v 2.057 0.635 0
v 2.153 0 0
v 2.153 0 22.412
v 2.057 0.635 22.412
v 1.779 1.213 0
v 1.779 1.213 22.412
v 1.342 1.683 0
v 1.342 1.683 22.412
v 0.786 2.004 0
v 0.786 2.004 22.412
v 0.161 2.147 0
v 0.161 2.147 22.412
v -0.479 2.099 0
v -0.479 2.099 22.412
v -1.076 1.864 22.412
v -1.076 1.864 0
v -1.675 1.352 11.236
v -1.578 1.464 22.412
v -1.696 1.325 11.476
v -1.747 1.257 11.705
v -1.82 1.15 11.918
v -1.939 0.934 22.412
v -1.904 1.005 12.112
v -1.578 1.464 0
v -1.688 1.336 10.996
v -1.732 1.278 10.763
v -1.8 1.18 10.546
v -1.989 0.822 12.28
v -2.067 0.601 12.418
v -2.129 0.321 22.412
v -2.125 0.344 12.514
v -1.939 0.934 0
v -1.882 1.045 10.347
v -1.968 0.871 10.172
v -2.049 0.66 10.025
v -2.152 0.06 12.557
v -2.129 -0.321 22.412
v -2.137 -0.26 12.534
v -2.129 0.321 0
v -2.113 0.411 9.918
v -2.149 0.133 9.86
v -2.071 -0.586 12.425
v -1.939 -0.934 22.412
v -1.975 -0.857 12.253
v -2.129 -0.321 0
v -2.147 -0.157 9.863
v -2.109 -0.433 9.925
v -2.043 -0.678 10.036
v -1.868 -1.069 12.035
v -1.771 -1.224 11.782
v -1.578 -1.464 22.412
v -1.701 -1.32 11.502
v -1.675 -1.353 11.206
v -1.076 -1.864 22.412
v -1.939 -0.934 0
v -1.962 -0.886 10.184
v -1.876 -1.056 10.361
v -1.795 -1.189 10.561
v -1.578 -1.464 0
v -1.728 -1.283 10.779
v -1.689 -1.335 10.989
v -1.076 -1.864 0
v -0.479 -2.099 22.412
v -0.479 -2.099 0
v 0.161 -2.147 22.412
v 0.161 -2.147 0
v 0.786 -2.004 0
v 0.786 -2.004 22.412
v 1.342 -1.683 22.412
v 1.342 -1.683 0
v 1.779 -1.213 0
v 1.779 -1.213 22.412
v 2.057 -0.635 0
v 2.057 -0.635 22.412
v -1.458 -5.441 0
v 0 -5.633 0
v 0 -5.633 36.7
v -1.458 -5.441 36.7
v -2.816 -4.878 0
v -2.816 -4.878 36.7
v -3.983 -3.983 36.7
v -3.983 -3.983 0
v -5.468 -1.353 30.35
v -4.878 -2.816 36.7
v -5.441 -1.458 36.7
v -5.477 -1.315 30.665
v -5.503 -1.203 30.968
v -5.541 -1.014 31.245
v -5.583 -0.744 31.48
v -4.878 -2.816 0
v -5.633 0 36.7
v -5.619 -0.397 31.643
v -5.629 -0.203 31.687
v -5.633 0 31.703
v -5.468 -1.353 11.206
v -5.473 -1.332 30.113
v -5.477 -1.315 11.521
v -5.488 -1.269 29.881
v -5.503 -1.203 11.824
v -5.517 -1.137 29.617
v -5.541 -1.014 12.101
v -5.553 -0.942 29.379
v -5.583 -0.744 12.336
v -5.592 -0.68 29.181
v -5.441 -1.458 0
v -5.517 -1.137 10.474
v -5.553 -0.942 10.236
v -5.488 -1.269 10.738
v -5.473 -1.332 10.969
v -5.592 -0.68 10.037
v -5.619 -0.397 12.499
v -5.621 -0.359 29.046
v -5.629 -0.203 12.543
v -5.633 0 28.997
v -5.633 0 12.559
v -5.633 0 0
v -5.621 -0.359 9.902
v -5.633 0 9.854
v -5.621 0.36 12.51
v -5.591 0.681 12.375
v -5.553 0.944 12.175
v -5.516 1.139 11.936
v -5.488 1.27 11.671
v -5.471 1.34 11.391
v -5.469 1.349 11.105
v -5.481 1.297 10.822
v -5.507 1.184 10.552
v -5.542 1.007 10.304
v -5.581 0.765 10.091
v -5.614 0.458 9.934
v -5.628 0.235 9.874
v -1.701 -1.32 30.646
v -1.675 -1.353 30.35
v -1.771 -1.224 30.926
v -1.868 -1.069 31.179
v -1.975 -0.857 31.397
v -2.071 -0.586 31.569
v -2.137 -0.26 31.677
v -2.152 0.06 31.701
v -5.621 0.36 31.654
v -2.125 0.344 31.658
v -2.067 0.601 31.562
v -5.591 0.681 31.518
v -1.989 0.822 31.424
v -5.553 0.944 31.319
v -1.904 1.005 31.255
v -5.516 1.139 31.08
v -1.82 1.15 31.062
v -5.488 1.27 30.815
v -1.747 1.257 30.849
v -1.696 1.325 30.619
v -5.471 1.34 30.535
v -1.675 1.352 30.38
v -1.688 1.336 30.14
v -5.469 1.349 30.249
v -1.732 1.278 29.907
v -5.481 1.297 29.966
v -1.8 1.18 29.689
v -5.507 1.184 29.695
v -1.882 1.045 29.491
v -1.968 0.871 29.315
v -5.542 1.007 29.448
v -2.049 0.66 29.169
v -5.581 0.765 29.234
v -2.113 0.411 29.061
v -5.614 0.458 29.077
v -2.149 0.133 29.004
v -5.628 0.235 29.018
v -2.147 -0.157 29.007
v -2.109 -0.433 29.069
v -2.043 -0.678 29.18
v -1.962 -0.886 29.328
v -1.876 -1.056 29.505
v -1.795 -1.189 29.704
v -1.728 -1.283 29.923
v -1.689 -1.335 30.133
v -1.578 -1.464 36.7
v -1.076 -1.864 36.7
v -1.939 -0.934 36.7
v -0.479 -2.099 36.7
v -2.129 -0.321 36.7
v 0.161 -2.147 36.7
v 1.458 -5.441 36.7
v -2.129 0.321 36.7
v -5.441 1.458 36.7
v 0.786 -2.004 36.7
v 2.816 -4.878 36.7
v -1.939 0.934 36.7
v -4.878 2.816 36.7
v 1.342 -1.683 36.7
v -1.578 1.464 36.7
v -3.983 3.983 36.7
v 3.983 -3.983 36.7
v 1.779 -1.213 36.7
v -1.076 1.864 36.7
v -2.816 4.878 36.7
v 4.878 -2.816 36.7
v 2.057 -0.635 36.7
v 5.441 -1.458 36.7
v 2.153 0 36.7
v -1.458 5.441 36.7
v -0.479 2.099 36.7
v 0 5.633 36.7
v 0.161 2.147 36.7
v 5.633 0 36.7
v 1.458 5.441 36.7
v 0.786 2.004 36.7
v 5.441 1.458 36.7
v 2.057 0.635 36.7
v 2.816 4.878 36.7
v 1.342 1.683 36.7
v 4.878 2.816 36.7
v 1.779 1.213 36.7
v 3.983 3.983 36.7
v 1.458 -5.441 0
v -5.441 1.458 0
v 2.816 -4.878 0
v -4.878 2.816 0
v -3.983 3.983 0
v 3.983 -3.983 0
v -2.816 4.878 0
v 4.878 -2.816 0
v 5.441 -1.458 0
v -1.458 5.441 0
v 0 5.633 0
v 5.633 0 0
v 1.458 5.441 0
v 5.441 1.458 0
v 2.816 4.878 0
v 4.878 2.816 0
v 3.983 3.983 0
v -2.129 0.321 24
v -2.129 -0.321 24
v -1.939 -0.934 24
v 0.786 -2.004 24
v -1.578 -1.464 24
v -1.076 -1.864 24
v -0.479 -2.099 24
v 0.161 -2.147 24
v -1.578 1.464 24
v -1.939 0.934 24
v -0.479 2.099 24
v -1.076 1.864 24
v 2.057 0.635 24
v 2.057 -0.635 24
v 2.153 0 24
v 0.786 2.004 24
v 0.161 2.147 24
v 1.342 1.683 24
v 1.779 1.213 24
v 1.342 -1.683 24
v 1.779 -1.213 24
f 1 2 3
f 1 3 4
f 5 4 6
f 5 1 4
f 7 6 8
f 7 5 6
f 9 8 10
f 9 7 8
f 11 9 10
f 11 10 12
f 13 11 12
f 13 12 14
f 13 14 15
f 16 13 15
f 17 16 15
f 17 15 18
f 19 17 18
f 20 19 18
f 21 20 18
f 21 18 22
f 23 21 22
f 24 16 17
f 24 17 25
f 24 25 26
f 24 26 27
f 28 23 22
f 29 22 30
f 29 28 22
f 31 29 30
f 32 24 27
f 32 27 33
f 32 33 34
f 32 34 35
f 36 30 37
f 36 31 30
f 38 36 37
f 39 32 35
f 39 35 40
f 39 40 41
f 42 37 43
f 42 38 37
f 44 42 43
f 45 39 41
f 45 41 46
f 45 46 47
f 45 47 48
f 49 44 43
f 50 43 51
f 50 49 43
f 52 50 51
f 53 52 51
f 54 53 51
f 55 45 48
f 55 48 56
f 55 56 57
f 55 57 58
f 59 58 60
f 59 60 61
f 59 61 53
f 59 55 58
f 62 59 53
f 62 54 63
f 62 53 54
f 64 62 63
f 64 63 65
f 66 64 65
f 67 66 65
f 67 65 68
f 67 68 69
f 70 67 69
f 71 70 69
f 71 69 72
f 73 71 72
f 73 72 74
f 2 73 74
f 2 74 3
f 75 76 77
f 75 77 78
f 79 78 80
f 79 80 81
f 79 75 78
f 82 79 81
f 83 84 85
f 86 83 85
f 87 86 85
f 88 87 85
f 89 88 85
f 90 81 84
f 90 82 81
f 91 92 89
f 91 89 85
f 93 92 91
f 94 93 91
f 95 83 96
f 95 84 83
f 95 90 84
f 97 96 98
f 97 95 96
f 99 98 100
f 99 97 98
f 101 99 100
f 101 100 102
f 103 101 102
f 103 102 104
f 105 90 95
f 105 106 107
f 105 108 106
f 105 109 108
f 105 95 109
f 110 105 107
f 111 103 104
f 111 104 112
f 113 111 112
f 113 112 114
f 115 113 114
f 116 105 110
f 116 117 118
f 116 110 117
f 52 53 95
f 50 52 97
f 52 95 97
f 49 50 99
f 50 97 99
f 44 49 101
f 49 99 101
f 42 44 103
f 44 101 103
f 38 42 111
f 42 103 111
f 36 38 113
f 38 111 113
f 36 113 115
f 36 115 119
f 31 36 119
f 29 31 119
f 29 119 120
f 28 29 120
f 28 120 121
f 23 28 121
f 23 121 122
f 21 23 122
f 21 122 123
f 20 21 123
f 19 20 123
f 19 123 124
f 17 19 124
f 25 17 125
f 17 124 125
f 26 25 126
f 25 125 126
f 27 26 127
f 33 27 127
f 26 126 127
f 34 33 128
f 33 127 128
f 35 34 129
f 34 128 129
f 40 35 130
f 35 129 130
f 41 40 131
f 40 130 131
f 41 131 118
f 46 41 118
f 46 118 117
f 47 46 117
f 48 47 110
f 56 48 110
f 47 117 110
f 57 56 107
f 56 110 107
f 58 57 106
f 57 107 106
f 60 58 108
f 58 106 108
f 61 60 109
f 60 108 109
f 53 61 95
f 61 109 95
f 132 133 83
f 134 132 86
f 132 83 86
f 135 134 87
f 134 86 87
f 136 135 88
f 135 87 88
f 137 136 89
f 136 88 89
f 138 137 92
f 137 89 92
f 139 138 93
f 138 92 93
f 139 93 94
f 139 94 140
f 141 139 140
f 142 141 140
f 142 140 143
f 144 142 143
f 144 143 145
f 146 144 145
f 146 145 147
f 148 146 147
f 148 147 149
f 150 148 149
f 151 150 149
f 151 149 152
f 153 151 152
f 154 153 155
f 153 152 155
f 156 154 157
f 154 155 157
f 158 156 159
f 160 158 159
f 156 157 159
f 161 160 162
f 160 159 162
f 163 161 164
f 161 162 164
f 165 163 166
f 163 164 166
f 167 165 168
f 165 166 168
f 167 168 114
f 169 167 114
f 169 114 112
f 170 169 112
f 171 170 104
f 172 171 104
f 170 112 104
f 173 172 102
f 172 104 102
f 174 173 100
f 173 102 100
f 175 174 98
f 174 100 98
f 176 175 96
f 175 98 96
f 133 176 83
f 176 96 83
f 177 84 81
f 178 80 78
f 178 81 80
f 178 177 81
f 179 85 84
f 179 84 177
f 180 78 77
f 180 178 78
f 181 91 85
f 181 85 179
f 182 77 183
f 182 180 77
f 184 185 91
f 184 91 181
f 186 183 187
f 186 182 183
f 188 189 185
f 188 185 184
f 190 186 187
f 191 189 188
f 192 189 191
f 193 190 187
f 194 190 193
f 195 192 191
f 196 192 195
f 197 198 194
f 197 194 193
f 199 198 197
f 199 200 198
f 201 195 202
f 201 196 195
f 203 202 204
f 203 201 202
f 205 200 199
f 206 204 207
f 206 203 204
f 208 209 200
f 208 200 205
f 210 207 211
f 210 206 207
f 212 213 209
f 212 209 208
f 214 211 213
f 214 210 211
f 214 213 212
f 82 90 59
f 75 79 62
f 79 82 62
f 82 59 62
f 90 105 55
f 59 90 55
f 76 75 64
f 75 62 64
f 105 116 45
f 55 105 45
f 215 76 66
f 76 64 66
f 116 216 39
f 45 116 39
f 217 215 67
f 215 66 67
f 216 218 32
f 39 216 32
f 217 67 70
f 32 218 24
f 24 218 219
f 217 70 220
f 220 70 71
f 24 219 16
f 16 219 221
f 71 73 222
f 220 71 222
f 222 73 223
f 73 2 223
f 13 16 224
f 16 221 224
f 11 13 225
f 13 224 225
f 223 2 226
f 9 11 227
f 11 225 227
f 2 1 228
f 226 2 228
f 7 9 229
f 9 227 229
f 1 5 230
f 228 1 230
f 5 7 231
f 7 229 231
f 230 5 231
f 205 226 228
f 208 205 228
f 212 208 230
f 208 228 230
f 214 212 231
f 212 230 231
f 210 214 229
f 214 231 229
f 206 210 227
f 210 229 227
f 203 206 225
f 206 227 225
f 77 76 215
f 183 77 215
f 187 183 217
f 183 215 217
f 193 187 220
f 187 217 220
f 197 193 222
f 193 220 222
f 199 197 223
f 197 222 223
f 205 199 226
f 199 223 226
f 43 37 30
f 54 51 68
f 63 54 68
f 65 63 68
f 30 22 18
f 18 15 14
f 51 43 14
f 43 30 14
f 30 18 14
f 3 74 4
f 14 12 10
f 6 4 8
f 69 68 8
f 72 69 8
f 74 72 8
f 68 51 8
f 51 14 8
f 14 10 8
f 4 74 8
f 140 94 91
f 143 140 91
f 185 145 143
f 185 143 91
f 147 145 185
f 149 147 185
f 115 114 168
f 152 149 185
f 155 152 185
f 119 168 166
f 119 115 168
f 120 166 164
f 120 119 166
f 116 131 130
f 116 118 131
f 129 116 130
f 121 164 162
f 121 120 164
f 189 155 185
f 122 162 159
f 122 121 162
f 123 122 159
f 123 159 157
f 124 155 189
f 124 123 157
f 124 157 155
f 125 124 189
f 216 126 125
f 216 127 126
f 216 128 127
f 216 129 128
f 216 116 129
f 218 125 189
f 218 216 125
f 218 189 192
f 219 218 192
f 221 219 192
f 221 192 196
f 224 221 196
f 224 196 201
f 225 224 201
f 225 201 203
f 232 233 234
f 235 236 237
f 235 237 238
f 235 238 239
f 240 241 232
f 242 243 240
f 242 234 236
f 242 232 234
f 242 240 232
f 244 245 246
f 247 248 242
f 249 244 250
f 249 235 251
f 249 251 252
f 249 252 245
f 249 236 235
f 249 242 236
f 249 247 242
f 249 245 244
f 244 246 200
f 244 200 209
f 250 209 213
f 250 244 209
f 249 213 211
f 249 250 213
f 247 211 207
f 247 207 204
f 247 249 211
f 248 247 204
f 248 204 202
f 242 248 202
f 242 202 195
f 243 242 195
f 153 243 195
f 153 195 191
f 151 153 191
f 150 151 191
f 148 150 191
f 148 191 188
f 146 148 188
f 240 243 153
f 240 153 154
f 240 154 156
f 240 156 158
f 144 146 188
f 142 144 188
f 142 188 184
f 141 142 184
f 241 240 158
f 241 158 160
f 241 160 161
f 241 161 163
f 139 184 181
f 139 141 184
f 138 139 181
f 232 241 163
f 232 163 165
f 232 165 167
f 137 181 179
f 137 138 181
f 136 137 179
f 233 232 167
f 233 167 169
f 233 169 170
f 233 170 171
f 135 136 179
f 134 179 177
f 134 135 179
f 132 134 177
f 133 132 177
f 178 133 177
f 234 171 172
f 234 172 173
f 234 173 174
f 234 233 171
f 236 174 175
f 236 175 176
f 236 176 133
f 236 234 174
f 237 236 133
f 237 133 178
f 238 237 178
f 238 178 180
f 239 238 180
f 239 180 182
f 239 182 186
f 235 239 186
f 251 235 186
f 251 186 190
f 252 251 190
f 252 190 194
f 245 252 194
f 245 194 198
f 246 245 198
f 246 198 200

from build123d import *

# Parameters (mm, degrees)
F0_W        = 11.2655872395
F0_H        = 11.2655872395
F0_R        = 2.15265
F1_DEPTH    = 22.4125
F2_W        = 11.2655872395
F2_H        = 11.2655872395
F3_DEPTH    = 1.5875
F4_W        = 11.2655872395
F4_H        = 11.2655872395
F4_R        = 2.15265
F5_DEPTH    = 12.7
F6_R        = 1.35255
F7_DEPTH    = 4.9581264334
F8_T1_DEPTH = 64.8639645


# Not quite as in the source:
# - a fillet or chamfer that OpenCascade refuses, or shapes differently, is made with other operations: its cross-section is extruded or revolved along the edge and cut away or added


with BuildPart() as f1:
    # F0 (on Top) → F1 (new body)
    with BuildSketch(Plane.XY):
        Rectangle(F0_W, F0_H)
        Circle(F0_R, mode=Mode.SUBTRACT)
    extrude(amount=F1_DEPTH)

    # F2 (on face) → F3 (join)
    with BuildSketch(Plane.XY.offset(22.4125)):
        Rectangle(F2_W, F2_H)
    extrude(amount=F3_DEPTH)

    # F4 (on face) → F5 (join)
    with BuildSketch(Plane.XY.offset(24)):
        Rectangle(F4_W, F4_H)
        Circle(F4_R, mode=Mode.SUBTRACT)
    extrude(amount=F5_DEPTH)

    # F6 (on face) → F7 (cut, up to face)
    with BuildSketch(Plane(origin=(-5.6327936197, 0, 0), x_dir=(0, -1, 0), z_dir=(-1, 0, 0))):
        with Locations((0, 11.20625)):
            Circle(F6_R)
        with Locations((0, 30.35)):
            Circle(F6_R)
    extrude(amount=-F7_DEPTH, mode=Mode.SUBTRACT)

    # F8: fillet of radius 5.6327929 on 4 edges, made by hand

    # F8_s2 → F8_t1 (cut)
    with BuildSketch(Plane.XY.offset(-14.08198225)):
        with BuildLine():
            ThreePointArc((-5.6327936197, 7.197e-07), (-3.9829867763, 3.9829867763), (-7.197e-07, 5.6327936197))
            Line((-7.197e-07, 5.6327936197), (-5.6327936197, 5.6327936197))
            Line((-5.6327936197, 5.6327936197), (-5.6327936197, 7.197e-07))
        make_face()
        with BuildLine():
            ThreePointArc((5.6327936197, 7.197e-07), (3.9829867763, 3.9829867763), (7.197e-07, 5.6327936197))
            Line((7.197e-07, 5.6327936197), (5.6327936197, 5.6327936197))
            Line((5.6327936197, 5.6327936197), (5.6327936197, 7.197e-07))
        make_face()
        with BuildLine():
            ThreePointArc((-7.197e-07, -5.6327936197), (-3.9829867763, -3.9829867763), (-5.6327936197, -7.197e-07))
            Line((-5.6327936197, -7.197e-07), (-5.6327936197, -5.6327936197))
            Line((-5.6327936197, -5.6327936197), (-7.197e-07, -5.6327936197))
        make_face()
        with BuildLine():
            ThreePointArc((7.197e-07, -5.6327936197), (3.9829867763, -3.9829867763), (5.6327936197, -7.197e-07))
            Line((5.6327936197, -7.197e-07), (5.6327936197, -5.6327936197))
            Line((5.6327936197, -5.6327936197), (7.197e-07, -5.6327936197))
        make_face()
    extrude(amount=F8_T1_DEPTH, mode=Mode.SUBTRACT)


solid = f1.part
